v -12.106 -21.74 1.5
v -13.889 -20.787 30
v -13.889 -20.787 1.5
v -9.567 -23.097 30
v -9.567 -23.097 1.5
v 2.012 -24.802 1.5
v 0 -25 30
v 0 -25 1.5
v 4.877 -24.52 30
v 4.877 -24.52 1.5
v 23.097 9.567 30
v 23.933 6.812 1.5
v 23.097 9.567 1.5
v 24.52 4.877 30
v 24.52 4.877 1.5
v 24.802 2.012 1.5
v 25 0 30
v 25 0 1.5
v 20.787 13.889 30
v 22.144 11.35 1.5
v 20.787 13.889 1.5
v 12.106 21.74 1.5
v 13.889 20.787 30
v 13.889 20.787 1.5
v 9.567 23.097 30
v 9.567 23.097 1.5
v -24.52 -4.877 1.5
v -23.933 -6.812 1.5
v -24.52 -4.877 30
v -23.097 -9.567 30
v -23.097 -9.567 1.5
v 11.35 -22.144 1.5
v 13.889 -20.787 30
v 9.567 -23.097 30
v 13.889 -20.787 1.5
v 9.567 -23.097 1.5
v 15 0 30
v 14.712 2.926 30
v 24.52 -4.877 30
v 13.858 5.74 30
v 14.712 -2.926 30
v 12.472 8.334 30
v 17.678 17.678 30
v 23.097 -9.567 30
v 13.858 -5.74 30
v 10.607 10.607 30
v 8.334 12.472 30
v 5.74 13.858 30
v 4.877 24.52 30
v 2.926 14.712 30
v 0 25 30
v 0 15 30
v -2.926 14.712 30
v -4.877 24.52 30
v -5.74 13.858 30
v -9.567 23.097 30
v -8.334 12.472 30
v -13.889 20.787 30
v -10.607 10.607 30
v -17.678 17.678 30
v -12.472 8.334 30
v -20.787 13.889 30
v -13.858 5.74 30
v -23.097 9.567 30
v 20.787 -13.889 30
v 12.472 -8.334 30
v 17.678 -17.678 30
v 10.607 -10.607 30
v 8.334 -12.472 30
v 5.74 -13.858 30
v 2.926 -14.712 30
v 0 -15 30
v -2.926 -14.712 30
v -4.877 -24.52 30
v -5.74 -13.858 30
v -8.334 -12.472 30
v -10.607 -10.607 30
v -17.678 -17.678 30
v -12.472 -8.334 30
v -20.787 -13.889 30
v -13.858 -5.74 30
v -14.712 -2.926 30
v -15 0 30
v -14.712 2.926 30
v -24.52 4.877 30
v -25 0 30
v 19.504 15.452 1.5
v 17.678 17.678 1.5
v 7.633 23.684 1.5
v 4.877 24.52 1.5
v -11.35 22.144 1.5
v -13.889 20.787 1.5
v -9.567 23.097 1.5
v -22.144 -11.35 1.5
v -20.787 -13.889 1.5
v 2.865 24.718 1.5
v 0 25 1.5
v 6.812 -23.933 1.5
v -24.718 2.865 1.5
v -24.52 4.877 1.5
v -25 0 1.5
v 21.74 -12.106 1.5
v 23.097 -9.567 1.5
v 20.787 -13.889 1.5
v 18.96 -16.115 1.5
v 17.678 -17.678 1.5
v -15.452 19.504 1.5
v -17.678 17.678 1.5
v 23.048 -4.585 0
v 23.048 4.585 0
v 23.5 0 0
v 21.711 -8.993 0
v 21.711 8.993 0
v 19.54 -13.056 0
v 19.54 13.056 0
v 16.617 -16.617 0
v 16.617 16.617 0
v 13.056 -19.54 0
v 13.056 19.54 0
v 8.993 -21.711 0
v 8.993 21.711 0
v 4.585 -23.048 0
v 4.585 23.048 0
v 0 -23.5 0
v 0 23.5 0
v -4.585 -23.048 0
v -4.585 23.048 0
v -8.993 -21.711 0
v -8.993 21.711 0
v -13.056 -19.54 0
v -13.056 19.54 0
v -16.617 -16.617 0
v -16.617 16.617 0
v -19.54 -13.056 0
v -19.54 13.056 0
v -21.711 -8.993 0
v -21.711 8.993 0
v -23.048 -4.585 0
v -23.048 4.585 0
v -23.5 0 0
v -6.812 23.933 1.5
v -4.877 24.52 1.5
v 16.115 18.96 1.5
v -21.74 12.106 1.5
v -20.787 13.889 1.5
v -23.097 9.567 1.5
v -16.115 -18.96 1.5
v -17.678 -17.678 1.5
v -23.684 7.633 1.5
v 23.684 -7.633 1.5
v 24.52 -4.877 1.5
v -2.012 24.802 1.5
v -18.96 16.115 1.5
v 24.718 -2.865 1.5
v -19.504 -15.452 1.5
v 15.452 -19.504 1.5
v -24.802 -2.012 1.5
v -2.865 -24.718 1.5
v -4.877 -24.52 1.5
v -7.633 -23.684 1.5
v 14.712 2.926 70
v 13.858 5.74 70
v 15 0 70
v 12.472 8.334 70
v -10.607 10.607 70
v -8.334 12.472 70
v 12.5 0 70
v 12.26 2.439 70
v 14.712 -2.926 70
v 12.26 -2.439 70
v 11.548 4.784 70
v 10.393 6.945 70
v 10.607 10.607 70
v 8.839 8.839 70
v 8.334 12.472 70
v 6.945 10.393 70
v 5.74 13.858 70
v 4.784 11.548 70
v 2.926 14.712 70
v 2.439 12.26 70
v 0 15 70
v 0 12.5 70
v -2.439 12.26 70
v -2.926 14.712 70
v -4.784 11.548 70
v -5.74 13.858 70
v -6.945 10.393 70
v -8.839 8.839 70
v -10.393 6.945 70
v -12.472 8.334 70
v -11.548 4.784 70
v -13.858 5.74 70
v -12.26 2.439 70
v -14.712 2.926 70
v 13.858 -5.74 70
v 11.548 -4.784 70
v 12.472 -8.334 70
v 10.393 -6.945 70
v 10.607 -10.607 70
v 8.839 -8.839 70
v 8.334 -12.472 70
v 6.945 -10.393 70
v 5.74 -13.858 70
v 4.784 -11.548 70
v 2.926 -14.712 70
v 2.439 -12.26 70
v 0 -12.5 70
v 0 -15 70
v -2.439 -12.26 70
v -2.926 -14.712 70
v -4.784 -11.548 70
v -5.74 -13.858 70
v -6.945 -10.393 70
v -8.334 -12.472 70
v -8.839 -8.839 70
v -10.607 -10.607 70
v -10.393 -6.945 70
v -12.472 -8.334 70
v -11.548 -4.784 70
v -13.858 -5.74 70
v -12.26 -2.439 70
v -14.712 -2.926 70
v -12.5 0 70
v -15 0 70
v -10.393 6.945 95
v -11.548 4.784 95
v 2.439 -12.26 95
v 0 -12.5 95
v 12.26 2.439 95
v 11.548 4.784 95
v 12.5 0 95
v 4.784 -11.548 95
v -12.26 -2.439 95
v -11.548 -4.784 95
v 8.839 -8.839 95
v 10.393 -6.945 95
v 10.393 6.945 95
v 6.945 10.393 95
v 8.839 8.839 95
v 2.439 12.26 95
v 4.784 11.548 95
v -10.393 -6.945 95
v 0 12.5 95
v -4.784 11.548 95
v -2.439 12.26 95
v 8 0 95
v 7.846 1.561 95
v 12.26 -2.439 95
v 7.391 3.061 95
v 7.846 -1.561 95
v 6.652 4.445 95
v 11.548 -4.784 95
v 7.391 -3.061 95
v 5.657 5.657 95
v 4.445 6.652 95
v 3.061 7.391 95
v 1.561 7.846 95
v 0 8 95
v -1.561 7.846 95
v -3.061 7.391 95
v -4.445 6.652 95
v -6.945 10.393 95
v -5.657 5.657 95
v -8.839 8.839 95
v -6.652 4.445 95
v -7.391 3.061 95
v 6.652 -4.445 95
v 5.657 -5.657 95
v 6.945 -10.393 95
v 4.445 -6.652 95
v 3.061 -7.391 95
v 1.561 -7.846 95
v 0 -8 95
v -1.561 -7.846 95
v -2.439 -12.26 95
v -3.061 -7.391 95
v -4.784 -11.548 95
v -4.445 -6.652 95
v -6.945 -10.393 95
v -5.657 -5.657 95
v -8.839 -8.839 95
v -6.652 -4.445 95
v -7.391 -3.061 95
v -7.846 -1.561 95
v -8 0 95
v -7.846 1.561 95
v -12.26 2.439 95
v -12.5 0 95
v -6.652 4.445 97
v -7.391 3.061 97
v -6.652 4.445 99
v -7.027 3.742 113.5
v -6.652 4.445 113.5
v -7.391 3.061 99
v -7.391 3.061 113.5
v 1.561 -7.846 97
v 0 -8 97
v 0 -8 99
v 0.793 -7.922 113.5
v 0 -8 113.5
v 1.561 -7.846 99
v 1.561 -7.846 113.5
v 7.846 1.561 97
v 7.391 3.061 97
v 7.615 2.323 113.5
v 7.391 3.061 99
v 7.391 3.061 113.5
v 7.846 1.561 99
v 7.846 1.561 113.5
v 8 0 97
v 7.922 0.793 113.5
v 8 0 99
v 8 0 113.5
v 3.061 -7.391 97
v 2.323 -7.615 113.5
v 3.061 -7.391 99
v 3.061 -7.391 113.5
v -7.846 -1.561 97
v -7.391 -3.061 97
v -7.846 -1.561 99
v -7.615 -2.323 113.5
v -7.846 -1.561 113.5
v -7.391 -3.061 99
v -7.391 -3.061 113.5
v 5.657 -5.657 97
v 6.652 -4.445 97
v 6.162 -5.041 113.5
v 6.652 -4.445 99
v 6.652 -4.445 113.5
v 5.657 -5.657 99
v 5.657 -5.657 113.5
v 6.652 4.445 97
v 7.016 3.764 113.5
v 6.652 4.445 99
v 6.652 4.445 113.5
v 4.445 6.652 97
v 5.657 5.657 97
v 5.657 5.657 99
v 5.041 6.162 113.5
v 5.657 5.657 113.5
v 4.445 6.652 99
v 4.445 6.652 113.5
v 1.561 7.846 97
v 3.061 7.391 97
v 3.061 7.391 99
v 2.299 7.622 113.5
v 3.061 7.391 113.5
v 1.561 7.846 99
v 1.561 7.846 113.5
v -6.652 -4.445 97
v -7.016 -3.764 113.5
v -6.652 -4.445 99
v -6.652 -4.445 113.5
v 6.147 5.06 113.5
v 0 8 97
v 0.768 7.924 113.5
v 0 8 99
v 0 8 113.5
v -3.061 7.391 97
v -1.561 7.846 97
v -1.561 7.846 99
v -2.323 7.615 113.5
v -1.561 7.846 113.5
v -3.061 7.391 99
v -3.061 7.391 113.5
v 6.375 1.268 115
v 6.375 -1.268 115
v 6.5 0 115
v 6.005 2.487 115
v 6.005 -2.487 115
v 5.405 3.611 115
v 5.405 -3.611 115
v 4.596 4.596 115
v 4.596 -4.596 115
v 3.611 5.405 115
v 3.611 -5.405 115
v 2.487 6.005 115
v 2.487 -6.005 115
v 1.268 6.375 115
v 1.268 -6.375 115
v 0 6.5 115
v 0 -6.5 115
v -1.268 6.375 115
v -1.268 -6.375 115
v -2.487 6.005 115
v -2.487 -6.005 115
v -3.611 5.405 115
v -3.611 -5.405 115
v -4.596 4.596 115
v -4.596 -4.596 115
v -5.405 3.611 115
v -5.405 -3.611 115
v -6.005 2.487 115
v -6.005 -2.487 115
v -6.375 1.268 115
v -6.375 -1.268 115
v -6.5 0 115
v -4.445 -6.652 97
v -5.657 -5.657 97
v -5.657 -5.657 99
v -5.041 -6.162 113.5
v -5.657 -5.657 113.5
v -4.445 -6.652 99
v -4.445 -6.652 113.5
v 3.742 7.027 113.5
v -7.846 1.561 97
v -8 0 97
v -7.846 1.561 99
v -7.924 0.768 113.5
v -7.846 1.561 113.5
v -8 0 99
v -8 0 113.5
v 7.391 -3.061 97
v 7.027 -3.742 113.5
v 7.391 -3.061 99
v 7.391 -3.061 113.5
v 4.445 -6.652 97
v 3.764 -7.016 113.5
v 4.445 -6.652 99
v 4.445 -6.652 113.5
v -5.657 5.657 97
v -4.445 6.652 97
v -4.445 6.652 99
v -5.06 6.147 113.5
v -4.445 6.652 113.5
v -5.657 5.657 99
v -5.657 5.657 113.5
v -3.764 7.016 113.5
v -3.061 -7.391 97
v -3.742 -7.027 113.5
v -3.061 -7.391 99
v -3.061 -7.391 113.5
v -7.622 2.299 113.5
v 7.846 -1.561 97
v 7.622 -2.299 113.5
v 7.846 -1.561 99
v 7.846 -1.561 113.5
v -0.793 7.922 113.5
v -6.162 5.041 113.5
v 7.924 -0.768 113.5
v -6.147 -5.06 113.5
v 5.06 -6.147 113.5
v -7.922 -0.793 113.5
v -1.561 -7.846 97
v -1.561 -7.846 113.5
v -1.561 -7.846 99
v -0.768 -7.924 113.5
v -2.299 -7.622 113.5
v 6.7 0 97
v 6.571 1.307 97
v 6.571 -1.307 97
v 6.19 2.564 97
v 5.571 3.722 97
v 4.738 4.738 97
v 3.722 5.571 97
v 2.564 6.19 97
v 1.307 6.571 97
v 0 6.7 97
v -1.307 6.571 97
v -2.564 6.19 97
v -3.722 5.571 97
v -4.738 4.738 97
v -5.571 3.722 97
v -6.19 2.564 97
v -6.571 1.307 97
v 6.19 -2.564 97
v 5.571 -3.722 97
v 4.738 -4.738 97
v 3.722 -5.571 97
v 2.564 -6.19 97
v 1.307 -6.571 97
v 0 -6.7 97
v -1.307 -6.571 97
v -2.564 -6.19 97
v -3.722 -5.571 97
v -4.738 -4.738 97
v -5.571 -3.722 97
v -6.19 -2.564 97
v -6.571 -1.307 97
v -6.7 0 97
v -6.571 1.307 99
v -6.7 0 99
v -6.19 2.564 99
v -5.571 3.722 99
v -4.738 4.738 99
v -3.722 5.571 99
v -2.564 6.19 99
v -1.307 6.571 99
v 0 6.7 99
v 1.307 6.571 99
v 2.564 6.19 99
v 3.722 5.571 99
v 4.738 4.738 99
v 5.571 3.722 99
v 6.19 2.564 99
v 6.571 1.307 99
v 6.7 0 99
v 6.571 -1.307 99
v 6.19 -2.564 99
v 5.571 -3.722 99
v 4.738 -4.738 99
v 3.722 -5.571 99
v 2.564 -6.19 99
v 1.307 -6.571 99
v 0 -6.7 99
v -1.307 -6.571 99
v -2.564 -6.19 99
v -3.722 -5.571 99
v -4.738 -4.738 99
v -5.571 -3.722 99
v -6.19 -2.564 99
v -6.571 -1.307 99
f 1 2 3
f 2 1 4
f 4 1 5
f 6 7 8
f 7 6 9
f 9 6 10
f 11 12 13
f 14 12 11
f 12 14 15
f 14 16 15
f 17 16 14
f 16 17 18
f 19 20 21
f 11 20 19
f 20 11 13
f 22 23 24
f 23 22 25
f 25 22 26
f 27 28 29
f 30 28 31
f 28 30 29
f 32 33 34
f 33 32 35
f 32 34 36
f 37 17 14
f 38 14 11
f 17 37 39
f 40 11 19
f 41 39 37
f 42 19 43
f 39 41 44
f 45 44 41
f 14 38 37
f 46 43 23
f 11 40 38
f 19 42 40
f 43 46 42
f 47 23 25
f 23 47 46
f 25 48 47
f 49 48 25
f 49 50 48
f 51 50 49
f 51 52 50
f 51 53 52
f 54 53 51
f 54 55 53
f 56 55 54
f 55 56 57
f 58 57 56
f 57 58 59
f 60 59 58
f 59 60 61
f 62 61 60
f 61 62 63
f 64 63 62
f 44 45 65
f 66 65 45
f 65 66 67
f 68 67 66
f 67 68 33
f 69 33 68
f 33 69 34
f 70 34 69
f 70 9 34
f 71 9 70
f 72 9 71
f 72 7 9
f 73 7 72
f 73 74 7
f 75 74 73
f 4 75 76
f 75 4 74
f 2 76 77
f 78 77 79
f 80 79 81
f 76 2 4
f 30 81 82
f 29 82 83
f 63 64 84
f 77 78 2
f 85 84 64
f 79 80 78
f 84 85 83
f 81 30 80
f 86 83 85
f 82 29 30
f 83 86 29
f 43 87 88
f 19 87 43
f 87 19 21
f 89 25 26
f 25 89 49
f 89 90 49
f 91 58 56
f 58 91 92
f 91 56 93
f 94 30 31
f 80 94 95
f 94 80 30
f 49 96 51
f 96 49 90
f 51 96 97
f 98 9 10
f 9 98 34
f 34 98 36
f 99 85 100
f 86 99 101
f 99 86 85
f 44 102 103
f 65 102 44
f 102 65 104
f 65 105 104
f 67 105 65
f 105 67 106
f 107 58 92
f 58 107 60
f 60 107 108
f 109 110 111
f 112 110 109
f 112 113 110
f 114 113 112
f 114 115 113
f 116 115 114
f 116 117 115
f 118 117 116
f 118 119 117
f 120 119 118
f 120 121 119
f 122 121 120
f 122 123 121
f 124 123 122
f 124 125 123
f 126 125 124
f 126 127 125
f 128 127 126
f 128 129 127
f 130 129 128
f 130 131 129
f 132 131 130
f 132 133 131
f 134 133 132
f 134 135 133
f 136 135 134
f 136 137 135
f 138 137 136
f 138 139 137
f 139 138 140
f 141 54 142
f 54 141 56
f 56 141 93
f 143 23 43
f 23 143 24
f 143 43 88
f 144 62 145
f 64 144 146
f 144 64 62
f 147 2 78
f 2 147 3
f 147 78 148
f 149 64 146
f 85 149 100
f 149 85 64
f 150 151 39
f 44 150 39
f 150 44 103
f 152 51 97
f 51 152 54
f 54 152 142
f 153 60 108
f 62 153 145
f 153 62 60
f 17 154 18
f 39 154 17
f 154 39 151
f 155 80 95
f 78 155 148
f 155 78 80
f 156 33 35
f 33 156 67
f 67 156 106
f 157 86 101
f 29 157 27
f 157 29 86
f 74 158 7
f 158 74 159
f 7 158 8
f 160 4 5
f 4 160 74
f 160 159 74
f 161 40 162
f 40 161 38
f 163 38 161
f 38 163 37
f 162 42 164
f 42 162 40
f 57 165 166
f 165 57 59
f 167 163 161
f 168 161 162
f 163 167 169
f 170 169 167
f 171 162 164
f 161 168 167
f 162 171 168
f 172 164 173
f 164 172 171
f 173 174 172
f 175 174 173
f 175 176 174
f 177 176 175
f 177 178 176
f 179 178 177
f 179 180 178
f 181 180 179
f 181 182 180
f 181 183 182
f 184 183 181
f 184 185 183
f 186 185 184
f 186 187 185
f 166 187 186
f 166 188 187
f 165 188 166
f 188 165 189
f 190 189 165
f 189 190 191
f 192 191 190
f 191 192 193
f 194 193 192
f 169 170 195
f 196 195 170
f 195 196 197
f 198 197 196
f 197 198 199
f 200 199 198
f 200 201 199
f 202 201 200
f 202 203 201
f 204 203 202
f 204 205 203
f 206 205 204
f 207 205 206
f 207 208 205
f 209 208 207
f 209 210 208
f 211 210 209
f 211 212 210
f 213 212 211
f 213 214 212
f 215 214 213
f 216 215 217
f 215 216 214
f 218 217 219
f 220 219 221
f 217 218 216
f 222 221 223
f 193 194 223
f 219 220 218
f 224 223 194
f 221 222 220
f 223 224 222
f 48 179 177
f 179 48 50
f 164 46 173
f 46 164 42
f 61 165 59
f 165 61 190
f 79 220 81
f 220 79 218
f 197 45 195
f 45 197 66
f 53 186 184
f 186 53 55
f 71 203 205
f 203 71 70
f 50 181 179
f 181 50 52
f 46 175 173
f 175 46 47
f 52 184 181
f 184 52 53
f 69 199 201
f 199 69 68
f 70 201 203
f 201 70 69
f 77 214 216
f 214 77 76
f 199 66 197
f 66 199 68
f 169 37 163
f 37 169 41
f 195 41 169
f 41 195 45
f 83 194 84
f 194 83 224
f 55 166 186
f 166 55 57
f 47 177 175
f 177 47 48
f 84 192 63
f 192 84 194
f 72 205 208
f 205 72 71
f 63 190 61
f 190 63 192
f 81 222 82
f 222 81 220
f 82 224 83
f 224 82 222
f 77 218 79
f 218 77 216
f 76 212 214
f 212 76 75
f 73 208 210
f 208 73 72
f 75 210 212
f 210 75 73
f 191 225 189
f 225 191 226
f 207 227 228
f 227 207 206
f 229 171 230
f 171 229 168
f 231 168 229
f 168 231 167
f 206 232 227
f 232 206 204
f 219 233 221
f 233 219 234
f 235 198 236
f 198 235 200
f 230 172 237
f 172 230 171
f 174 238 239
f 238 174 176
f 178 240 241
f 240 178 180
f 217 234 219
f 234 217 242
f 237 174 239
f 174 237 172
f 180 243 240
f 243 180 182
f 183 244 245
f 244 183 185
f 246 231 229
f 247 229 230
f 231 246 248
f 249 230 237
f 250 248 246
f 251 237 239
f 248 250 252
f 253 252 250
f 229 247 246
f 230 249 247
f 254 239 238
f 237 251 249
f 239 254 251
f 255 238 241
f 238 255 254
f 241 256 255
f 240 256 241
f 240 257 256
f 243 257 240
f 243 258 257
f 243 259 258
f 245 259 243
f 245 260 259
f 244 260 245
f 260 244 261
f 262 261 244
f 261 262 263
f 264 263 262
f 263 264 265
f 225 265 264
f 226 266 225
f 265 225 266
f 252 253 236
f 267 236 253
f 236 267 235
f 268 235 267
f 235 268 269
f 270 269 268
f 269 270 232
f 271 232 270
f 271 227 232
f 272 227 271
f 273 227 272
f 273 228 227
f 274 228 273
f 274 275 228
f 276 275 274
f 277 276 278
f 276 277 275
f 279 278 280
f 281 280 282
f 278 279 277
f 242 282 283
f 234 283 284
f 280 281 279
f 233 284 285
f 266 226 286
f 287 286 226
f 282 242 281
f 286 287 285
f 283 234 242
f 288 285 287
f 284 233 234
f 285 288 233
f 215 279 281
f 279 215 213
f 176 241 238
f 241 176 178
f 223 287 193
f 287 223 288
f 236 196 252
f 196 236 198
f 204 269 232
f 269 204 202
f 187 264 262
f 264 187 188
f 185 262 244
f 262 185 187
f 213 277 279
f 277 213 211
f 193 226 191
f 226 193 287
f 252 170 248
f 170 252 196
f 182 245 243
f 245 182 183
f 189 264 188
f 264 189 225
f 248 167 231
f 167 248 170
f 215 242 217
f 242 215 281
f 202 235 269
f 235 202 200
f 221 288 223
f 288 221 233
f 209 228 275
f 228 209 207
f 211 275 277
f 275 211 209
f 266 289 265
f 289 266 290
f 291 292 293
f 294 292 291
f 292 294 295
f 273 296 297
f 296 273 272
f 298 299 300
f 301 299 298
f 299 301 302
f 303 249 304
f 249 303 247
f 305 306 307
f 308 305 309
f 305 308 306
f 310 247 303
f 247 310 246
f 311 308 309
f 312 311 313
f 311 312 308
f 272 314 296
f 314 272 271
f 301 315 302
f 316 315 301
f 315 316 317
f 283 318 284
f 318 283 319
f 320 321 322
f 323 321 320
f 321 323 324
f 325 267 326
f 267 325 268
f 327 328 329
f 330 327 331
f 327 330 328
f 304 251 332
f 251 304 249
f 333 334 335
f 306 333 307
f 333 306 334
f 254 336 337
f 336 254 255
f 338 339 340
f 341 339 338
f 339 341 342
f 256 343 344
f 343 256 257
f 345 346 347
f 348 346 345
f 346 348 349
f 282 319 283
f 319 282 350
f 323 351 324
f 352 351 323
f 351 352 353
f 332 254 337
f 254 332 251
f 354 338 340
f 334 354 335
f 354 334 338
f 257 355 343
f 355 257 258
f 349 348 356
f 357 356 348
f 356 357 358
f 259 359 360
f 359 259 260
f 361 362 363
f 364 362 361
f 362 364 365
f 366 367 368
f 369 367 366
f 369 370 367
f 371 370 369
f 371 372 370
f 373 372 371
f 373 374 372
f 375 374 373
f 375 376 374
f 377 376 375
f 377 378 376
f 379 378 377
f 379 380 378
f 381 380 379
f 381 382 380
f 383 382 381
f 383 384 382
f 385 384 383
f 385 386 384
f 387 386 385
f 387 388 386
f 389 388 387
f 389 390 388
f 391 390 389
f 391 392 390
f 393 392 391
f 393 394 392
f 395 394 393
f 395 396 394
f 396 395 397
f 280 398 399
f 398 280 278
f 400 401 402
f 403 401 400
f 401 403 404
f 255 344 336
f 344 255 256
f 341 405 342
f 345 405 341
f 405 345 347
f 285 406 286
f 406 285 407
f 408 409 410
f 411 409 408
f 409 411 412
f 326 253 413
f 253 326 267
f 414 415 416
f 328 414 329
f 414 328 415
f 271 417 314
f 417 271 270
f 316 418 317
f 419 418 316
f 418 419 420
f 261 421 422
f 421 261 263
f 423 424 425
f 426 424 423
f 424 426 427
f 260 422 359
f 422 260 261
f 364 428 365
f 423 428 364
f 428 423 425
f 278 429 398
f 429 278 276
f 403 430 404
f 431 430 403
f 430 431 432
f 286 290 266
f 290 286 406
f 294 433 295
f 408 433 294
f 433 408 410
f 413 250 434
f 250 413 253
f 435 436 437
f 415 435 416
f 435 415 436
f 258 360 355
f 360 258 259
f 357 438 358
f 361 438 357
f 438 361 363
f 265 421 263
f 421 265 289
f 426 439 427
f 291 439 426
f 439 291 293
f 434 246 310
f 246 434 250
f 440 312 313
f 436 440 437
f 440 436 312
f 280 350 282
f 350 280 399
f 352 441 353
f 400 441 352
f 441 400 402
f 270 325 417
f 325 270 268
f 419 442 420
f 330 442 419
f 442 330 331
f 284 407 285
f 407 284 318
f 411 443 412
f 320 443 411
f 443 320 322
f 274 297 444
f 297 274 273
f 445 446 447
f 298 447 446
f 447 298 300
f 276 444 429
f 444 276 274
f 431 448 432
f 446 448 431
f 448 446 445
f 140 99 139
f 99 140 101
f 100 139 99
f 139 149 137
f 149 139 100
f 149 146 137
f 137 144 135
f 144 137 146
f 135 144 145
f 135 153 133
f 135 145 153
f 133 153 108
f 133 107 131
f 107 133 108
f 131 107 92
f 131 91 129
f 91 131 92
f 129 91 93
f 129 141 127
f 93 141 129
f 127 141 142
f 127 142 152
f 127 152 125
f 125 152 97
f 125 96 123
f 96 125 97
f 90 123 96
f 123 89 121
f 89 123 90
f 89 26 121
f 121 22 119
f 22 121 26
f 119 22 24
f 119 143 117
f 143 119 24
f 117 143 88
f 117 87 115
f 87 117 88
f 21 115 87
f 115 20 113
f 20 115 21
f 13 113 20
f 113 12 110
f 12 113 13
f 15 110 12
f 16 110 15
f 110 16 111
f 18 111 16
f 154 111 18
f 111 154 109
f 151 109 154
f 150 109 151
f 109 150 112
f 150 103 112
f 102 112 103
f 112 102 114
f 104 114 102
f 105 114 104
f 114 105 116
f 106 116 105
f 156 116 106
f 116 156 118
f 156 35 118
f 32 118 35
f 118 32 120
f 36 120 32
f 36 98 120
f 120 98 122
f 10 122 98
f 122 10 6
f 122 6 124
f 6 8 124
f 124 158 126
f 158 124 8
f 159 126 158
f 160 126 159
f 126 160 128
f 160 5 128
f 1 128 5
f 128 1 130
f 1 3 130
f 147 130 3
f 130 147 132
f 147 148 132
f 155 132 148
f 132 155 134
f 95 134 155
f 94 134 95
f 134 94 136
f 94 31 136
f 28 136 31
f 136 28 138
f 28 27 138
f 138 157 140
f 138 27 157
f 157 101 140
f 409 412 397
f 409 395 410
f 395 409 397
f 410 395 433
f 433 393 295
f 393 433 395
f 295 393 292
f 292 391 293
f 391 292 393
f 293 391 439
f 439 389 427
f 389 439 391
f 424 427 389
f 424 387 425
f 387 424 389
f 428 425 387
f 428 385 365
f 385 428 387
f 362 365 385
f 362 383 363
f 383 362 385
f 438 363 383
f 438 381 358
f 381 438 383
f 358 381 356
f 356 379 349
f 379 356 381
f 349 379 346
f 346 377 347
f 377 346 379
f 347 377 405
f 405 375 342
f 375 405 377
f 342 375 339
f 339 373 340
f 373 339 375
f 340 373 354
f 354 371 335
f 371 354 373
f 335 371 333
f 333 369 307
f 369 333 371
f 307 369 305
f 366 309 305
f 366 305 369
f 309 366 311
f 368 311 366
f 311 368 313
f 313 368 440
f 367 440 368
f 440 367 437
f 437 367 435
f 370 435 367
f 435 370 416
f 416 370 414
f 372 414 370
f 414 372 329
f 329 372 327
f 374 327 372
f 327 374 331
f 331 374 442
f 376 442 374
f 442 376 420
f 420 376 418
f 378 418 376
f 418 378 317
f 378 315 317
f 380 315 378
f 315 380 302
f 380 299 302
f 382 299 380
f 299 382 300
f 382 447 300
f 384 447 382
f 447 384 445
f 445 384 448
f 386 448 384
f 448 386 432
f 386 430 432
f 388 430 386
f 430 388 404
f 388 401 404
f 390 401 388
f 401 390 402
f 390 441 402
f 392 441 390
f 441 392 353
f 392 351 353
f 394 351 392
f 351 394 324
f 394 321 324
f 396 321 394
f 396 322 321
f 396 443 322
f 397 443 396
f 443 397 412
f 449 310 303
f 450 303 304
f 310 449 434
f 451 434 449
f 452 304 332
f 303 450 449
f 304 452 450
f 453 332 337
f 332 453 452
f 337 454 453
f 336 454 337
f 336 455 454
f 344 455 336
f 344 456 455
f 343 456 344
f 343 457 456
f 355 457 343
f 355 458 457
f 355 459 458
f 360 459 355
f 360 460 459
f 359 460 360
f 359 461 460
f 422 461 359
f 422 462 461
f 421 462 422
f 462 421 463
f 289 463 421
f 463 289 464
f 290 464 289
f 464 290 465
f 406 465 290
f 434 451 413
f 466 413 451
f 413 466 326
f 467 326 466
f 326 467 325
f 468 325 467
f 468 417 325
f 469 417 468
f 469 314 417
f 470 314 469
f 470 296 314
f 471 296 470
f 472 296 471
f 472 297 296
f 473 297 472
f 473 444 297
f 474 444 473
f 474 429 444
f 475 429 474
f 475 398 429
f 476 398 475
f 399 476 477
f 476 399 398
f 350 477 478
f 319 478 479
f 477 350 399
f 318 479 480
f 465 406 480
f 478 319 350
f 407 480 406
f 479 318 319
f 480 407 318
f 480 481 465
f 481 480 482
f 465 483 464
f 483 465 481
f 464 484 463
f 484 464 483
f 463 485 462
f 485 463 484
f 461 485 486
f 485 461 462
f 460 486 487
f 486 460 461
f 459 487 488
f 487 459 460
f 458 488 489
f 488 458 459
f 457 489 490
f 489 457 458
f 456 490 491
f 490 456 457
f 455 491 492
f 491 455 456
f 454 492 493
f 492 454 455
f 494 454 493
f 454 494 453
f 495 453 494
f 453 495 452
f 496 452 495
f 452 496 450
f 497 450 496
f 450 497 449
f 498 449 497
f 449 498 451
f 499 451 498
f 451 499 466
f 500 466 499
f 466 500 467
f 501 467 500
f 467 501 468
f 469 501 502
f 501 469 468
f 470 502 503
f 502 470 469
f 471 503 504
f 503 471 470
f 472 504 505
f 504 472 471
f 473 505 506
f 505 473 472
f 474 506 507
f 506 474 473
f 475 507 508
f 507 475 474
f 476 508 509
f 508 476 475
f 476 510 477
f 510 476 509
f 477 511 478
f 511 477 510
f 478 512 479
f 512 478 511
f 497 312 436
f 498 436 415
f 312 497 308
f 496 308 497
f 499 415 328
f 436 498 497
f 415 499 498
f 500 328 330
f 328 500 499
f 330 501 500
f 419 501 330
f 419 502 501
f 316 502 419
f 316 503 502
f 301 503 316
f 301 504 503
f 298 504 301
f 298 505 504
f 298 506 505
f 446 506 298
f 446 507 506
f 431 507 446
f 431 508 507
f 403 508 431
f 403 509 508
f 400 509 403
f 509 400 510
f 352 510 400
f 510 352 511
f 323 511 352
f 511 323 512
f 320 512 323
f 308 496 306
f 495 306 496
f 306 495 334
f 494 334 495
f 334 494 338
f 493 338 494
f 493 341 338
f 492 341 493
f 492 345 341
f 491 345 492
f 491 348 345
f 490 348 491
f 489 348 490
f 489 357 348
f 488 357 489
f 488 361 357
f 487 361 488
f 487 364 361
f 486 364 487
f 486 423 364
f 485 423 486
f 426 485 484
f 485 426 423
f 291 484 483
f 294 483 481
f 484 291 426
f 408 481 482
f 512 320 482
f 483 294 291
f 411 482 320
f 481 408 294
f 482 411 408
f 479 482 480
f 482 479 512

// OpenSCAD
$fn = 32;

// ----------------------------------------------------------------------
// Stepped shaft: diameters 50, 30, 25, 16 mm, 115 mm long
// ----------------------------------------------------------------------

// --- parameters (mm) ---
d1 = 50;                  // step 1 diameter
len1 = 30;                // step 1 length
d2 = 30;                  // step 2 diameter
len2 = 40;                // step 2 length
d3 = 25;                  // step 3 diameter
len3 = 25;                // step 3 length
d4 = 16;                  // step 4 diameter
len4 = 20;                // step 4 length
total = 115;              // overall length
chamfer = 1.5;            // end chamfer
groove_r = 8;             // groove radius
groove_z = 97;            // groove position from the end
groove_w = 2;             // groove width
groove_d = 1.3;           // groove depth

difference() {
  /* turned body: stacked cylinders, every step sunk into the bigger one */
  union() {
    cylinder(h = len1, d = d1);
    translate([0, 0, 29.6]) cylinder(h = 40.4, d = d2);
    translate([0, 0, 69.6]) cylinder(h = 25.4, d = d3);
    translate([0, 0, 94.6]) cylinder(h = 20.4, d = d4);
  }
  /* bottom chamfer ring cut */
  rotate_extrude() translate([23.5, -2.5]) polygon([[0, 0], [4, 0], [4, 6.5], [0, 2.5]]);
  /* top chamfer ring cut */
  rotate_extrude() translate([6.5, 115]) polygon([[0, 0], [4, -4], [4, 2.5], [0, 2.5]]);
  /* circlip groove just behind the shoulder */
  rotate_extrude() translate([groove_r - groove_d, groove_z]) square([groove_d + 2.5, groove_w]);
}
